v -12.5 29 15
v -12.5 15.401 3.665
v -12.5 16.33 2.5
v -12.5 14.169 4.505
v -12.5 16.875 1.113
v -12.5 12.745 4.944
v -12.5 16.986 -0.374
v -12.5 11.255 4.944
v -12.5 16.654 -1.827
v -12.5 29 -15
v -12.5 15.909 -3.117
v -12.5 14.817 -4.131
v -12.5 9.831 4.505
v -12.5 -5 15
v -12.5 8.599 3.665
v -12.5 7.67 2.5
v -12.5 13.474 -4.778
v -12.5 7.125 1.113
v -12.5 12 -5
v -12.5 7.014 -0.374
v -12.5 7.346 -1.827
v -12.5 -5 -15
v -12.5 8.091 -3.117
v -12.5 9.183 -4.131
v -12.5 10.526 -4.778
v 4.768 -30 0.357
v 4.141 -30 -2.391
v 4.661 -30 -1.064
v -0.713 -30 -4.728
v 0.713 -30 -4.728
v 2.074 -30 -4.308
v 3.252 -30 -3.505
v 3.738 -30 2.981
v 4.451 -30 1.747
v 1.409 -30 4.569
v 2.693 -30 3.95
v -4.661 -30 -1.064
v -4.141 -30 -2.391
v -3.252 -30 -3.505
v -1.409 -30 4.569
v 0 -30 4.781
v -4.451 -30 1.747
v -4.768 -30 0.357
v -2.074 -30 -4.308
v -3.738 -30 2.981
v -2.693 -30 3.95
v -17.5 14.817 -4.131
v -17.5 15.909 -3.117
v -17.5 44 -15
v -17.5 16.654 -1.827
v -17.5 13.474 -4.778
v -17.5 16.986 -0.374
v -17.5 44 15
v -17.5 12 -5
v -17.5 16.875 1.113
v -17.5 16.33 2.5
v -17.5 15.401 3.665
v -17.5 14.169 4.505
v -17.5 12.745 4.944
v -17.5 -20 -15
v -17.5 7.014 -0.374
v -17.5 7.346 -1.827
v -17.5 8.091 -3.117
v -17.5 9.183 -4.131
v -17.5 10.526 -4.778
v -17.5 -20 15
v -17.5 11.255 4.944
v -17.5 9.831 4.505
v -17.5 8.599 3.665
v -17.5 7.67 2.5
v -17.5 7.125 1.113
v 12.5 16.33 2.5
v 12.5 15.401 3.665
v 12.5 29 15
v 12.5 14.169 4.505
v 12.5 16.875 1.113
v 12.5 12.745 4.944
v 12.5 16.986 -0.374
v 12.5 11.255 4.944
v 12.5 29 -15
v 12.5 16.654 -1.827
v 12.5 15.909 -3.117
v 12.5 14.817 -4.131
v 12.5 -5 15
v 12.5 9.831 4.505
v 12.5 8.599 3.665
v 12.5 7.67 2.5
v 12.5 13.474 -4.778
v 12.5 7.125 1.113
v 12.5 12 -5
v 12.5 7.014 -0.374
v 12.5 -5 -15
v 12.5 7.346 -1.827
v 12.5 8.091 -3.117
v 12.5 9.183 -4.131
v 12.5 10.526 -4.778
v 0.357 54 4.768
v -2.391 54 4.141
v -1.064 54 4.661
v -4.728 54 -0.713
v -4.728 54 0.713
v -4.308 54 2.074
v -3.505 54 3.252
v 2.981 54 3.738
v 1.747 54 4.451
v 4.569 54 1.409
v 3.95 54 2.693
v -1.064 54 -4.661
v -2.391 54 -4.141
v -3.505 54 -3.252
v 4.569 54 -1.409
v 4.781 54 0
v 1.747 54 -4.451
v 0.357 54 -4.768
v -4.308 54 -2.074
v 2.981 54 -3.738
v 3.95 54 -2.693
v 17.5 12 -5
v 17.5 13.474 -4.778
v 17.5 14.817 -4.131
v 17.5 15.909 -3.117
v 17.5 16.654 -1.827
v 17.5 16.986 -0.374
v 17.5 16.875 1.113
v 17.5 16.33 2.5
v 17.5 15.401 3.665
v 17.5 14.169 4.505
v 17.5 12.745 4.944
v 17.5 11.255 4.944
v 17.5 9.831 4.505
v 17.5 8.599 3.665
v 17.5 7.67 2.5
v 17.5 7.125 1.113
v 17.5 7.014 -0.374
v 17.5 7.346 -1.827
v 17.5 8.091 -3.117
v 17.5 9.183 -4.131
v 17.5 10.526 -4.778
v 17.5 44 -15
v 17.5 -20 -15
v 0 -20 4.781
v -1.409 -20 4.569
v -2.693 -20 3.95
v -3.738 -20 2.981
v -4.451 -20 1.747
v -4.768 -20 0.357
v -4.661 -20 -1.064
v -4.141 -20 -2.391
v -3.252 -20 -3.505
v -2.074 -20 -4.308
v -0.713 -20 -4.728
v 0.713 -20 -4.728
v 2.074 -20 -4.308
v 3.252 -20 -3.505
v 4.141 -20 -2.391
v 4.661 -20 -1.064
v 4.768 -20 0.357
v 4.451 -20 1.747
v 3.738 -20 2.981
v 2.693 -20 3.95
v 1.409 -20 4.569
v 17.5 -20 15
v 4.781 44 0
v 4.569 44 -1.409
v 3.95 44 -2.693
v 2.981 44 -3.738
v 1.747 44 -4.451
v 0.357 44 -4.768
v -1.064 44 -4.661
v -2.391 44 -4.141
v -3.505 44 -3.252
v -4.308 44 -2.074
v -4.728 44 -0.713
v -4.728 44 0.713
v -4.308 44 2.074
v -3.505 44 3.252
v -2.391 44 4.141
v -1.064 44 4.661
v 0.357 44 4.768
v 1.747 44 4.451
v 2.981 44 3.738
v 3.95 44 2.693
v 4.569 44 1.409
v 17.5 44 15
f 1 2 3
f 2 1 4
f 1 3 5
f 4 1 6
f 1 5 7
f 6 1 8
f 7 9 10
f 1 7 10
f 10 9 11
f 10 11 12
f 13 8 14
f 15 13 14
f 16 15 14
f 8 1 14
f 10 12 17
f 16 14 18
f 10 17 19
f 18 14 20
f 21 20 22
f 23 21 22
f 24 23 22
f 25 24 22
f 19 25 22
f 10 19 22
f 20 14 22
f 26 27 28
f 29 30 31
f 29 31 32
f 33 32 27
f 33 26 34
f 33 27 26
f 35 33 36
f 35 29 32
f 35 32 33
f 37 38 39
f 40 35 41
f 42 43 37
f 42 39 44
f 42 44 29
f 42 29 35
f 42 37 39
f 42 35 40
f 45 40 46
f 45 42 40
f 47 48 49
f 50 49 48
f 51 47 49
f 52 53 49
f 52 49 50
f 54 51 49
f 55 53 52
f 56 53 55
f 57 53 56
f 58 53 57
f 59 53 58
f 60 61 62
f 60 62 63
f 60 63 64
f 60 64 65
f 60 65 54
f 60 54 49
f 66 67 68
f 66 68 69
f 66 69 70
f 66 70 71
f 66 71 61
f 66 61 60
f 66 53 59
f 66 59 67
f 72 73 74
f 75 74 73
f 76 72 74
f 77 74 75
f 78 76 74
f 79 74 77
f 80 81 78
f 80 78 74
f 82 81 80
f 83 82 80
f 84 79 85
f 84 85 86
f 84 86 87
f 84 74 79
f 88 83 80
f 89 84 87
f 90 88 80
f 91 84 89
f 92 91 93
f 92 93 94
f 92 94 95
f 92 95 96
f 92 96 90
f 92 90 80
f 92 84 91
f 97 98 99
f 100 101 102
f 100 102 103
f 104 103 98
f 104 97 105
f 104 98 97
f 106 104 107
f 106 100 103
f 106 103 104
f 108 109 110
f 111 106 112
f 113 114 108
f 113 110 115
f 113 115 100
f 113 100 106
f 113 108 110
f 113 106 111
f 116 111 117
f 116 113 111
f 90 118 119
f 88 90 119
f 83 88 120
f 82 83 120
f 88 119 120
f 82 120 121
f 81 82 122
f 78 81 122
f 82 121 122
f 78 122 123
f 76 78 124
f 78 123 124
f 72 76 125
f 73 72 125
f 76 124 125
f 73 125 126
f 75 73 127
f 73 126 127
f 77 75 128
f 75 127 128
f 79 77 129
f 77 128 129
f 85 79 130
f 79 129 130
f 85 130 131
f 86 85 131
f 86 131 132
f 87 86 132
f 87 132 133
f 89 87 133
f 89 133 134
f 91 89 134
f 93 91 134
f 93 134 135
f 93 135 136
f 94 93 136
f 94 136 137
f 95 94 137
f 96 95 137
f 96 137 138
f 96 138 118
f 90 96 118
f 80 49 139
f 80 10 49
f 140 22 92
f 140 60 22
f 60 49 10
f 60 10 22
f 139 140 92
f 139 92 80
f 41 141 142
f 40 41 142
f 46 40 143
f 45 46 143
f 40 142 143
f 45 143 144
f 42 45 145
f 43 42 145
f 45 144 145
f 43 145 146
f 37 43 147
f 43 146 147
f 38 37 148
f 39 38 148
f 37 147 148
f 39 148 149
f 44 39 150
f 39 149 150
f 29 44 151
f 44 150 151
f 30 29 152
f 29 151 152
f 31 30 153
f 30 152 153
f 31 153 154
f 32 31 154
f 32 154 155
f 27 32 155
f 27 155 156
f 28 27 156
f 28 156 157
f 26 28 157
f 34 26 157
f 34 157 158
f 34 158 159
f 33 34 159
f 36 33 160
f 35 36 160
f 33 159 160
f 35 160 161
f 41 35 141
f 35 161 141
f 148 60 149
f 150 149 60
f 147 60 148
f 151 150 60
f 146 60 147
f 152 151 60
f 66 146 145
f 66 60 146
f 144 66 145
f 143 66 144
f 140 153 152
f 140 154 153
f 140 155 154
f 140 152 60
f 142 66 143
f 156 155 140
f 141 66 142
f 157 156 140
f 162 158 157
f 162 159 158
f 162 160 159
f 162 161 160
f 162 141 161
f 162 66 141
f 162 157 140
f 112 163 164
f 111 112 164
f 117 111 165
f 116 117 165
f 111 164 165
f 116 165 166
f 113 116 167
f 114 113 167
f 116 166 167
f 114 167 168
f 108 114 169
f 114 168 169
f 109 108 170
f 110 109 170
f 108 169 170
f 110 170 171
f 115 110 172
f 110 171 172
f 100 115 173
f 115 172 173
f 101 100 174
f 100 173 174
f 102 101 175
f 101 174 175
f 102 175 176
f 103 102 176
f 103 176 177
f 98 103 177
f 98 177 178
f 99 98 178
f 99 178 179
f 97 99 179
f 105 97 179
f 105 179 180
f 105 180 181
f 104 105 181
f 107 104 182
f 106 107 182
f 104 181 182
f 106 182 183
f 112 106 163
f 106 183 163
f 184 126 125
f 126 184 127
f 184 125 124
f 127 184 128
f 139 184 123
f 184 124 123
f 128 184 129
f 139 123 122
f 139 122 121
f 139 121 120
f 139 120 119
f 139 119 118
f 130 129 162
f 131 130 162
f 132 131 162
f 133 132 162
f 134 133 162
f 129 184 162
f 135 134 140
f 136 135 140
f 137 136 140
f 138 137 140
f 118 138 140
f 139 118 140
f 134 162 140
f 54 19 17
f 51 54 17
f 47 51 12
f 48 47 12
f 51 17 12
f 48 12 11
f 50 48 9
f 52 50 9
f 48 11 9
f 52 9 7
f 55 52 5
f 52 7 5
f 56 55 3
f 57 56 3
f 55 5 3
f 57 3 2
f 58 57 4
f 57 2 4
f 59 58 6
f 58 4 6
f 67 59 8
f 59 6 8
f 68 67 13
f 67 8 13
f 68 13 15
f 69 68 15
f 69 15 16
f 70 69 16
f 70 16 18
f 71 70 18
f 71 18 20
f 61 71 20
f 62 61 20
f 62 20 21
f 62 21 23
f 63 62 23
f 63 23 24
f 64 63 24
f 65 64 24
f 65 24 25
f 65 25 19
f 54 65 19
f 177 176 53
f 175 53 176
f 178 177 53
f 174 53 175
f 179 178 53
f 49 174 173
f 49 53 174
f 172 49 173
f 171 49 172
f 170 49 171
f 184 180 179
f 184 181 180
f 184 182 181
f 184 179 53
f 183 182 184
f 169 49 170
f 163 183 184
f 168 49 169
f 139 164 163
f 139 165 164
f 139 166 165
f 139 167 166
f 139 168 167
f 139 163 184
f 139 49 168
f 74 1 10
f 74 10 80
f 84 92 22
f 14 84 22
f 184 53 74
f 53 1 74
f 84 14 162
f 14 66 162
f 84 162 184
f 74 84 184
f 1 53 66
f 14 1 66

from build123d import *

# Parameters (mm, degrees)
EXTRUDE_1_DEPTH     = 15
SKETCH_2_R          = 5
CUT_EXTRUDE_1_DEPTH = 44.011626335
SKETCH_3_R          = 4.781082329
EXTRUDE_2_DEPTH     = 10


with BuildPart() as part:
    # 草图1 → 凸台-拉伸1 (new, symmetric)
    with BuildSketch(Plane.XY):
        Polygon((-17.5, -20), (17.5, -20), (17.5, 20), (12.5, 20), (12.5, -5), (-12.5, -5), (-12.5, 20), (-17.5, 20), align=None)
    extrude_1 = extrude(amount=EXTRUDE_1_DEPTH, both=True)

    # 草图2 → 切除-拉伸1 (cut, through all)
    with BuildSketch(Plane(origin=(17.5, 0, 0), x_dir=(0, 0, -1), z_dir=(1, 0, 0))):
        with Locations((0, 12)):
            Circle(SKETCH_2_R)
    cut_extrude_1 = extrude(amount=-CUT_EXTRUDE_1_DEPTH, mode=Mode.SUBTRACT)

    # 草图3 → 凸台-拉伸2 (add)
    with BuildSketch(Plane.XZ.offset(20)):
        Circle(SKETCH_3_R)
    extrude_2 = extrude(amount=EXTRUDE_2_DEPTH)

    # 镜向1: 凸台-拉伸1, 切除-拉伸1, 凸台-拉伸2 across plane
    add(extrude_1.mirror(Plane.ZX.offset(12)))
    add(cut_extrude_1.mirror(Plane.ZX.offset(12)), mode=Mode.SUBTRACT)
    add(extrude_2.mirror(Plane.ZX.offset(12)))


solid = part.part
